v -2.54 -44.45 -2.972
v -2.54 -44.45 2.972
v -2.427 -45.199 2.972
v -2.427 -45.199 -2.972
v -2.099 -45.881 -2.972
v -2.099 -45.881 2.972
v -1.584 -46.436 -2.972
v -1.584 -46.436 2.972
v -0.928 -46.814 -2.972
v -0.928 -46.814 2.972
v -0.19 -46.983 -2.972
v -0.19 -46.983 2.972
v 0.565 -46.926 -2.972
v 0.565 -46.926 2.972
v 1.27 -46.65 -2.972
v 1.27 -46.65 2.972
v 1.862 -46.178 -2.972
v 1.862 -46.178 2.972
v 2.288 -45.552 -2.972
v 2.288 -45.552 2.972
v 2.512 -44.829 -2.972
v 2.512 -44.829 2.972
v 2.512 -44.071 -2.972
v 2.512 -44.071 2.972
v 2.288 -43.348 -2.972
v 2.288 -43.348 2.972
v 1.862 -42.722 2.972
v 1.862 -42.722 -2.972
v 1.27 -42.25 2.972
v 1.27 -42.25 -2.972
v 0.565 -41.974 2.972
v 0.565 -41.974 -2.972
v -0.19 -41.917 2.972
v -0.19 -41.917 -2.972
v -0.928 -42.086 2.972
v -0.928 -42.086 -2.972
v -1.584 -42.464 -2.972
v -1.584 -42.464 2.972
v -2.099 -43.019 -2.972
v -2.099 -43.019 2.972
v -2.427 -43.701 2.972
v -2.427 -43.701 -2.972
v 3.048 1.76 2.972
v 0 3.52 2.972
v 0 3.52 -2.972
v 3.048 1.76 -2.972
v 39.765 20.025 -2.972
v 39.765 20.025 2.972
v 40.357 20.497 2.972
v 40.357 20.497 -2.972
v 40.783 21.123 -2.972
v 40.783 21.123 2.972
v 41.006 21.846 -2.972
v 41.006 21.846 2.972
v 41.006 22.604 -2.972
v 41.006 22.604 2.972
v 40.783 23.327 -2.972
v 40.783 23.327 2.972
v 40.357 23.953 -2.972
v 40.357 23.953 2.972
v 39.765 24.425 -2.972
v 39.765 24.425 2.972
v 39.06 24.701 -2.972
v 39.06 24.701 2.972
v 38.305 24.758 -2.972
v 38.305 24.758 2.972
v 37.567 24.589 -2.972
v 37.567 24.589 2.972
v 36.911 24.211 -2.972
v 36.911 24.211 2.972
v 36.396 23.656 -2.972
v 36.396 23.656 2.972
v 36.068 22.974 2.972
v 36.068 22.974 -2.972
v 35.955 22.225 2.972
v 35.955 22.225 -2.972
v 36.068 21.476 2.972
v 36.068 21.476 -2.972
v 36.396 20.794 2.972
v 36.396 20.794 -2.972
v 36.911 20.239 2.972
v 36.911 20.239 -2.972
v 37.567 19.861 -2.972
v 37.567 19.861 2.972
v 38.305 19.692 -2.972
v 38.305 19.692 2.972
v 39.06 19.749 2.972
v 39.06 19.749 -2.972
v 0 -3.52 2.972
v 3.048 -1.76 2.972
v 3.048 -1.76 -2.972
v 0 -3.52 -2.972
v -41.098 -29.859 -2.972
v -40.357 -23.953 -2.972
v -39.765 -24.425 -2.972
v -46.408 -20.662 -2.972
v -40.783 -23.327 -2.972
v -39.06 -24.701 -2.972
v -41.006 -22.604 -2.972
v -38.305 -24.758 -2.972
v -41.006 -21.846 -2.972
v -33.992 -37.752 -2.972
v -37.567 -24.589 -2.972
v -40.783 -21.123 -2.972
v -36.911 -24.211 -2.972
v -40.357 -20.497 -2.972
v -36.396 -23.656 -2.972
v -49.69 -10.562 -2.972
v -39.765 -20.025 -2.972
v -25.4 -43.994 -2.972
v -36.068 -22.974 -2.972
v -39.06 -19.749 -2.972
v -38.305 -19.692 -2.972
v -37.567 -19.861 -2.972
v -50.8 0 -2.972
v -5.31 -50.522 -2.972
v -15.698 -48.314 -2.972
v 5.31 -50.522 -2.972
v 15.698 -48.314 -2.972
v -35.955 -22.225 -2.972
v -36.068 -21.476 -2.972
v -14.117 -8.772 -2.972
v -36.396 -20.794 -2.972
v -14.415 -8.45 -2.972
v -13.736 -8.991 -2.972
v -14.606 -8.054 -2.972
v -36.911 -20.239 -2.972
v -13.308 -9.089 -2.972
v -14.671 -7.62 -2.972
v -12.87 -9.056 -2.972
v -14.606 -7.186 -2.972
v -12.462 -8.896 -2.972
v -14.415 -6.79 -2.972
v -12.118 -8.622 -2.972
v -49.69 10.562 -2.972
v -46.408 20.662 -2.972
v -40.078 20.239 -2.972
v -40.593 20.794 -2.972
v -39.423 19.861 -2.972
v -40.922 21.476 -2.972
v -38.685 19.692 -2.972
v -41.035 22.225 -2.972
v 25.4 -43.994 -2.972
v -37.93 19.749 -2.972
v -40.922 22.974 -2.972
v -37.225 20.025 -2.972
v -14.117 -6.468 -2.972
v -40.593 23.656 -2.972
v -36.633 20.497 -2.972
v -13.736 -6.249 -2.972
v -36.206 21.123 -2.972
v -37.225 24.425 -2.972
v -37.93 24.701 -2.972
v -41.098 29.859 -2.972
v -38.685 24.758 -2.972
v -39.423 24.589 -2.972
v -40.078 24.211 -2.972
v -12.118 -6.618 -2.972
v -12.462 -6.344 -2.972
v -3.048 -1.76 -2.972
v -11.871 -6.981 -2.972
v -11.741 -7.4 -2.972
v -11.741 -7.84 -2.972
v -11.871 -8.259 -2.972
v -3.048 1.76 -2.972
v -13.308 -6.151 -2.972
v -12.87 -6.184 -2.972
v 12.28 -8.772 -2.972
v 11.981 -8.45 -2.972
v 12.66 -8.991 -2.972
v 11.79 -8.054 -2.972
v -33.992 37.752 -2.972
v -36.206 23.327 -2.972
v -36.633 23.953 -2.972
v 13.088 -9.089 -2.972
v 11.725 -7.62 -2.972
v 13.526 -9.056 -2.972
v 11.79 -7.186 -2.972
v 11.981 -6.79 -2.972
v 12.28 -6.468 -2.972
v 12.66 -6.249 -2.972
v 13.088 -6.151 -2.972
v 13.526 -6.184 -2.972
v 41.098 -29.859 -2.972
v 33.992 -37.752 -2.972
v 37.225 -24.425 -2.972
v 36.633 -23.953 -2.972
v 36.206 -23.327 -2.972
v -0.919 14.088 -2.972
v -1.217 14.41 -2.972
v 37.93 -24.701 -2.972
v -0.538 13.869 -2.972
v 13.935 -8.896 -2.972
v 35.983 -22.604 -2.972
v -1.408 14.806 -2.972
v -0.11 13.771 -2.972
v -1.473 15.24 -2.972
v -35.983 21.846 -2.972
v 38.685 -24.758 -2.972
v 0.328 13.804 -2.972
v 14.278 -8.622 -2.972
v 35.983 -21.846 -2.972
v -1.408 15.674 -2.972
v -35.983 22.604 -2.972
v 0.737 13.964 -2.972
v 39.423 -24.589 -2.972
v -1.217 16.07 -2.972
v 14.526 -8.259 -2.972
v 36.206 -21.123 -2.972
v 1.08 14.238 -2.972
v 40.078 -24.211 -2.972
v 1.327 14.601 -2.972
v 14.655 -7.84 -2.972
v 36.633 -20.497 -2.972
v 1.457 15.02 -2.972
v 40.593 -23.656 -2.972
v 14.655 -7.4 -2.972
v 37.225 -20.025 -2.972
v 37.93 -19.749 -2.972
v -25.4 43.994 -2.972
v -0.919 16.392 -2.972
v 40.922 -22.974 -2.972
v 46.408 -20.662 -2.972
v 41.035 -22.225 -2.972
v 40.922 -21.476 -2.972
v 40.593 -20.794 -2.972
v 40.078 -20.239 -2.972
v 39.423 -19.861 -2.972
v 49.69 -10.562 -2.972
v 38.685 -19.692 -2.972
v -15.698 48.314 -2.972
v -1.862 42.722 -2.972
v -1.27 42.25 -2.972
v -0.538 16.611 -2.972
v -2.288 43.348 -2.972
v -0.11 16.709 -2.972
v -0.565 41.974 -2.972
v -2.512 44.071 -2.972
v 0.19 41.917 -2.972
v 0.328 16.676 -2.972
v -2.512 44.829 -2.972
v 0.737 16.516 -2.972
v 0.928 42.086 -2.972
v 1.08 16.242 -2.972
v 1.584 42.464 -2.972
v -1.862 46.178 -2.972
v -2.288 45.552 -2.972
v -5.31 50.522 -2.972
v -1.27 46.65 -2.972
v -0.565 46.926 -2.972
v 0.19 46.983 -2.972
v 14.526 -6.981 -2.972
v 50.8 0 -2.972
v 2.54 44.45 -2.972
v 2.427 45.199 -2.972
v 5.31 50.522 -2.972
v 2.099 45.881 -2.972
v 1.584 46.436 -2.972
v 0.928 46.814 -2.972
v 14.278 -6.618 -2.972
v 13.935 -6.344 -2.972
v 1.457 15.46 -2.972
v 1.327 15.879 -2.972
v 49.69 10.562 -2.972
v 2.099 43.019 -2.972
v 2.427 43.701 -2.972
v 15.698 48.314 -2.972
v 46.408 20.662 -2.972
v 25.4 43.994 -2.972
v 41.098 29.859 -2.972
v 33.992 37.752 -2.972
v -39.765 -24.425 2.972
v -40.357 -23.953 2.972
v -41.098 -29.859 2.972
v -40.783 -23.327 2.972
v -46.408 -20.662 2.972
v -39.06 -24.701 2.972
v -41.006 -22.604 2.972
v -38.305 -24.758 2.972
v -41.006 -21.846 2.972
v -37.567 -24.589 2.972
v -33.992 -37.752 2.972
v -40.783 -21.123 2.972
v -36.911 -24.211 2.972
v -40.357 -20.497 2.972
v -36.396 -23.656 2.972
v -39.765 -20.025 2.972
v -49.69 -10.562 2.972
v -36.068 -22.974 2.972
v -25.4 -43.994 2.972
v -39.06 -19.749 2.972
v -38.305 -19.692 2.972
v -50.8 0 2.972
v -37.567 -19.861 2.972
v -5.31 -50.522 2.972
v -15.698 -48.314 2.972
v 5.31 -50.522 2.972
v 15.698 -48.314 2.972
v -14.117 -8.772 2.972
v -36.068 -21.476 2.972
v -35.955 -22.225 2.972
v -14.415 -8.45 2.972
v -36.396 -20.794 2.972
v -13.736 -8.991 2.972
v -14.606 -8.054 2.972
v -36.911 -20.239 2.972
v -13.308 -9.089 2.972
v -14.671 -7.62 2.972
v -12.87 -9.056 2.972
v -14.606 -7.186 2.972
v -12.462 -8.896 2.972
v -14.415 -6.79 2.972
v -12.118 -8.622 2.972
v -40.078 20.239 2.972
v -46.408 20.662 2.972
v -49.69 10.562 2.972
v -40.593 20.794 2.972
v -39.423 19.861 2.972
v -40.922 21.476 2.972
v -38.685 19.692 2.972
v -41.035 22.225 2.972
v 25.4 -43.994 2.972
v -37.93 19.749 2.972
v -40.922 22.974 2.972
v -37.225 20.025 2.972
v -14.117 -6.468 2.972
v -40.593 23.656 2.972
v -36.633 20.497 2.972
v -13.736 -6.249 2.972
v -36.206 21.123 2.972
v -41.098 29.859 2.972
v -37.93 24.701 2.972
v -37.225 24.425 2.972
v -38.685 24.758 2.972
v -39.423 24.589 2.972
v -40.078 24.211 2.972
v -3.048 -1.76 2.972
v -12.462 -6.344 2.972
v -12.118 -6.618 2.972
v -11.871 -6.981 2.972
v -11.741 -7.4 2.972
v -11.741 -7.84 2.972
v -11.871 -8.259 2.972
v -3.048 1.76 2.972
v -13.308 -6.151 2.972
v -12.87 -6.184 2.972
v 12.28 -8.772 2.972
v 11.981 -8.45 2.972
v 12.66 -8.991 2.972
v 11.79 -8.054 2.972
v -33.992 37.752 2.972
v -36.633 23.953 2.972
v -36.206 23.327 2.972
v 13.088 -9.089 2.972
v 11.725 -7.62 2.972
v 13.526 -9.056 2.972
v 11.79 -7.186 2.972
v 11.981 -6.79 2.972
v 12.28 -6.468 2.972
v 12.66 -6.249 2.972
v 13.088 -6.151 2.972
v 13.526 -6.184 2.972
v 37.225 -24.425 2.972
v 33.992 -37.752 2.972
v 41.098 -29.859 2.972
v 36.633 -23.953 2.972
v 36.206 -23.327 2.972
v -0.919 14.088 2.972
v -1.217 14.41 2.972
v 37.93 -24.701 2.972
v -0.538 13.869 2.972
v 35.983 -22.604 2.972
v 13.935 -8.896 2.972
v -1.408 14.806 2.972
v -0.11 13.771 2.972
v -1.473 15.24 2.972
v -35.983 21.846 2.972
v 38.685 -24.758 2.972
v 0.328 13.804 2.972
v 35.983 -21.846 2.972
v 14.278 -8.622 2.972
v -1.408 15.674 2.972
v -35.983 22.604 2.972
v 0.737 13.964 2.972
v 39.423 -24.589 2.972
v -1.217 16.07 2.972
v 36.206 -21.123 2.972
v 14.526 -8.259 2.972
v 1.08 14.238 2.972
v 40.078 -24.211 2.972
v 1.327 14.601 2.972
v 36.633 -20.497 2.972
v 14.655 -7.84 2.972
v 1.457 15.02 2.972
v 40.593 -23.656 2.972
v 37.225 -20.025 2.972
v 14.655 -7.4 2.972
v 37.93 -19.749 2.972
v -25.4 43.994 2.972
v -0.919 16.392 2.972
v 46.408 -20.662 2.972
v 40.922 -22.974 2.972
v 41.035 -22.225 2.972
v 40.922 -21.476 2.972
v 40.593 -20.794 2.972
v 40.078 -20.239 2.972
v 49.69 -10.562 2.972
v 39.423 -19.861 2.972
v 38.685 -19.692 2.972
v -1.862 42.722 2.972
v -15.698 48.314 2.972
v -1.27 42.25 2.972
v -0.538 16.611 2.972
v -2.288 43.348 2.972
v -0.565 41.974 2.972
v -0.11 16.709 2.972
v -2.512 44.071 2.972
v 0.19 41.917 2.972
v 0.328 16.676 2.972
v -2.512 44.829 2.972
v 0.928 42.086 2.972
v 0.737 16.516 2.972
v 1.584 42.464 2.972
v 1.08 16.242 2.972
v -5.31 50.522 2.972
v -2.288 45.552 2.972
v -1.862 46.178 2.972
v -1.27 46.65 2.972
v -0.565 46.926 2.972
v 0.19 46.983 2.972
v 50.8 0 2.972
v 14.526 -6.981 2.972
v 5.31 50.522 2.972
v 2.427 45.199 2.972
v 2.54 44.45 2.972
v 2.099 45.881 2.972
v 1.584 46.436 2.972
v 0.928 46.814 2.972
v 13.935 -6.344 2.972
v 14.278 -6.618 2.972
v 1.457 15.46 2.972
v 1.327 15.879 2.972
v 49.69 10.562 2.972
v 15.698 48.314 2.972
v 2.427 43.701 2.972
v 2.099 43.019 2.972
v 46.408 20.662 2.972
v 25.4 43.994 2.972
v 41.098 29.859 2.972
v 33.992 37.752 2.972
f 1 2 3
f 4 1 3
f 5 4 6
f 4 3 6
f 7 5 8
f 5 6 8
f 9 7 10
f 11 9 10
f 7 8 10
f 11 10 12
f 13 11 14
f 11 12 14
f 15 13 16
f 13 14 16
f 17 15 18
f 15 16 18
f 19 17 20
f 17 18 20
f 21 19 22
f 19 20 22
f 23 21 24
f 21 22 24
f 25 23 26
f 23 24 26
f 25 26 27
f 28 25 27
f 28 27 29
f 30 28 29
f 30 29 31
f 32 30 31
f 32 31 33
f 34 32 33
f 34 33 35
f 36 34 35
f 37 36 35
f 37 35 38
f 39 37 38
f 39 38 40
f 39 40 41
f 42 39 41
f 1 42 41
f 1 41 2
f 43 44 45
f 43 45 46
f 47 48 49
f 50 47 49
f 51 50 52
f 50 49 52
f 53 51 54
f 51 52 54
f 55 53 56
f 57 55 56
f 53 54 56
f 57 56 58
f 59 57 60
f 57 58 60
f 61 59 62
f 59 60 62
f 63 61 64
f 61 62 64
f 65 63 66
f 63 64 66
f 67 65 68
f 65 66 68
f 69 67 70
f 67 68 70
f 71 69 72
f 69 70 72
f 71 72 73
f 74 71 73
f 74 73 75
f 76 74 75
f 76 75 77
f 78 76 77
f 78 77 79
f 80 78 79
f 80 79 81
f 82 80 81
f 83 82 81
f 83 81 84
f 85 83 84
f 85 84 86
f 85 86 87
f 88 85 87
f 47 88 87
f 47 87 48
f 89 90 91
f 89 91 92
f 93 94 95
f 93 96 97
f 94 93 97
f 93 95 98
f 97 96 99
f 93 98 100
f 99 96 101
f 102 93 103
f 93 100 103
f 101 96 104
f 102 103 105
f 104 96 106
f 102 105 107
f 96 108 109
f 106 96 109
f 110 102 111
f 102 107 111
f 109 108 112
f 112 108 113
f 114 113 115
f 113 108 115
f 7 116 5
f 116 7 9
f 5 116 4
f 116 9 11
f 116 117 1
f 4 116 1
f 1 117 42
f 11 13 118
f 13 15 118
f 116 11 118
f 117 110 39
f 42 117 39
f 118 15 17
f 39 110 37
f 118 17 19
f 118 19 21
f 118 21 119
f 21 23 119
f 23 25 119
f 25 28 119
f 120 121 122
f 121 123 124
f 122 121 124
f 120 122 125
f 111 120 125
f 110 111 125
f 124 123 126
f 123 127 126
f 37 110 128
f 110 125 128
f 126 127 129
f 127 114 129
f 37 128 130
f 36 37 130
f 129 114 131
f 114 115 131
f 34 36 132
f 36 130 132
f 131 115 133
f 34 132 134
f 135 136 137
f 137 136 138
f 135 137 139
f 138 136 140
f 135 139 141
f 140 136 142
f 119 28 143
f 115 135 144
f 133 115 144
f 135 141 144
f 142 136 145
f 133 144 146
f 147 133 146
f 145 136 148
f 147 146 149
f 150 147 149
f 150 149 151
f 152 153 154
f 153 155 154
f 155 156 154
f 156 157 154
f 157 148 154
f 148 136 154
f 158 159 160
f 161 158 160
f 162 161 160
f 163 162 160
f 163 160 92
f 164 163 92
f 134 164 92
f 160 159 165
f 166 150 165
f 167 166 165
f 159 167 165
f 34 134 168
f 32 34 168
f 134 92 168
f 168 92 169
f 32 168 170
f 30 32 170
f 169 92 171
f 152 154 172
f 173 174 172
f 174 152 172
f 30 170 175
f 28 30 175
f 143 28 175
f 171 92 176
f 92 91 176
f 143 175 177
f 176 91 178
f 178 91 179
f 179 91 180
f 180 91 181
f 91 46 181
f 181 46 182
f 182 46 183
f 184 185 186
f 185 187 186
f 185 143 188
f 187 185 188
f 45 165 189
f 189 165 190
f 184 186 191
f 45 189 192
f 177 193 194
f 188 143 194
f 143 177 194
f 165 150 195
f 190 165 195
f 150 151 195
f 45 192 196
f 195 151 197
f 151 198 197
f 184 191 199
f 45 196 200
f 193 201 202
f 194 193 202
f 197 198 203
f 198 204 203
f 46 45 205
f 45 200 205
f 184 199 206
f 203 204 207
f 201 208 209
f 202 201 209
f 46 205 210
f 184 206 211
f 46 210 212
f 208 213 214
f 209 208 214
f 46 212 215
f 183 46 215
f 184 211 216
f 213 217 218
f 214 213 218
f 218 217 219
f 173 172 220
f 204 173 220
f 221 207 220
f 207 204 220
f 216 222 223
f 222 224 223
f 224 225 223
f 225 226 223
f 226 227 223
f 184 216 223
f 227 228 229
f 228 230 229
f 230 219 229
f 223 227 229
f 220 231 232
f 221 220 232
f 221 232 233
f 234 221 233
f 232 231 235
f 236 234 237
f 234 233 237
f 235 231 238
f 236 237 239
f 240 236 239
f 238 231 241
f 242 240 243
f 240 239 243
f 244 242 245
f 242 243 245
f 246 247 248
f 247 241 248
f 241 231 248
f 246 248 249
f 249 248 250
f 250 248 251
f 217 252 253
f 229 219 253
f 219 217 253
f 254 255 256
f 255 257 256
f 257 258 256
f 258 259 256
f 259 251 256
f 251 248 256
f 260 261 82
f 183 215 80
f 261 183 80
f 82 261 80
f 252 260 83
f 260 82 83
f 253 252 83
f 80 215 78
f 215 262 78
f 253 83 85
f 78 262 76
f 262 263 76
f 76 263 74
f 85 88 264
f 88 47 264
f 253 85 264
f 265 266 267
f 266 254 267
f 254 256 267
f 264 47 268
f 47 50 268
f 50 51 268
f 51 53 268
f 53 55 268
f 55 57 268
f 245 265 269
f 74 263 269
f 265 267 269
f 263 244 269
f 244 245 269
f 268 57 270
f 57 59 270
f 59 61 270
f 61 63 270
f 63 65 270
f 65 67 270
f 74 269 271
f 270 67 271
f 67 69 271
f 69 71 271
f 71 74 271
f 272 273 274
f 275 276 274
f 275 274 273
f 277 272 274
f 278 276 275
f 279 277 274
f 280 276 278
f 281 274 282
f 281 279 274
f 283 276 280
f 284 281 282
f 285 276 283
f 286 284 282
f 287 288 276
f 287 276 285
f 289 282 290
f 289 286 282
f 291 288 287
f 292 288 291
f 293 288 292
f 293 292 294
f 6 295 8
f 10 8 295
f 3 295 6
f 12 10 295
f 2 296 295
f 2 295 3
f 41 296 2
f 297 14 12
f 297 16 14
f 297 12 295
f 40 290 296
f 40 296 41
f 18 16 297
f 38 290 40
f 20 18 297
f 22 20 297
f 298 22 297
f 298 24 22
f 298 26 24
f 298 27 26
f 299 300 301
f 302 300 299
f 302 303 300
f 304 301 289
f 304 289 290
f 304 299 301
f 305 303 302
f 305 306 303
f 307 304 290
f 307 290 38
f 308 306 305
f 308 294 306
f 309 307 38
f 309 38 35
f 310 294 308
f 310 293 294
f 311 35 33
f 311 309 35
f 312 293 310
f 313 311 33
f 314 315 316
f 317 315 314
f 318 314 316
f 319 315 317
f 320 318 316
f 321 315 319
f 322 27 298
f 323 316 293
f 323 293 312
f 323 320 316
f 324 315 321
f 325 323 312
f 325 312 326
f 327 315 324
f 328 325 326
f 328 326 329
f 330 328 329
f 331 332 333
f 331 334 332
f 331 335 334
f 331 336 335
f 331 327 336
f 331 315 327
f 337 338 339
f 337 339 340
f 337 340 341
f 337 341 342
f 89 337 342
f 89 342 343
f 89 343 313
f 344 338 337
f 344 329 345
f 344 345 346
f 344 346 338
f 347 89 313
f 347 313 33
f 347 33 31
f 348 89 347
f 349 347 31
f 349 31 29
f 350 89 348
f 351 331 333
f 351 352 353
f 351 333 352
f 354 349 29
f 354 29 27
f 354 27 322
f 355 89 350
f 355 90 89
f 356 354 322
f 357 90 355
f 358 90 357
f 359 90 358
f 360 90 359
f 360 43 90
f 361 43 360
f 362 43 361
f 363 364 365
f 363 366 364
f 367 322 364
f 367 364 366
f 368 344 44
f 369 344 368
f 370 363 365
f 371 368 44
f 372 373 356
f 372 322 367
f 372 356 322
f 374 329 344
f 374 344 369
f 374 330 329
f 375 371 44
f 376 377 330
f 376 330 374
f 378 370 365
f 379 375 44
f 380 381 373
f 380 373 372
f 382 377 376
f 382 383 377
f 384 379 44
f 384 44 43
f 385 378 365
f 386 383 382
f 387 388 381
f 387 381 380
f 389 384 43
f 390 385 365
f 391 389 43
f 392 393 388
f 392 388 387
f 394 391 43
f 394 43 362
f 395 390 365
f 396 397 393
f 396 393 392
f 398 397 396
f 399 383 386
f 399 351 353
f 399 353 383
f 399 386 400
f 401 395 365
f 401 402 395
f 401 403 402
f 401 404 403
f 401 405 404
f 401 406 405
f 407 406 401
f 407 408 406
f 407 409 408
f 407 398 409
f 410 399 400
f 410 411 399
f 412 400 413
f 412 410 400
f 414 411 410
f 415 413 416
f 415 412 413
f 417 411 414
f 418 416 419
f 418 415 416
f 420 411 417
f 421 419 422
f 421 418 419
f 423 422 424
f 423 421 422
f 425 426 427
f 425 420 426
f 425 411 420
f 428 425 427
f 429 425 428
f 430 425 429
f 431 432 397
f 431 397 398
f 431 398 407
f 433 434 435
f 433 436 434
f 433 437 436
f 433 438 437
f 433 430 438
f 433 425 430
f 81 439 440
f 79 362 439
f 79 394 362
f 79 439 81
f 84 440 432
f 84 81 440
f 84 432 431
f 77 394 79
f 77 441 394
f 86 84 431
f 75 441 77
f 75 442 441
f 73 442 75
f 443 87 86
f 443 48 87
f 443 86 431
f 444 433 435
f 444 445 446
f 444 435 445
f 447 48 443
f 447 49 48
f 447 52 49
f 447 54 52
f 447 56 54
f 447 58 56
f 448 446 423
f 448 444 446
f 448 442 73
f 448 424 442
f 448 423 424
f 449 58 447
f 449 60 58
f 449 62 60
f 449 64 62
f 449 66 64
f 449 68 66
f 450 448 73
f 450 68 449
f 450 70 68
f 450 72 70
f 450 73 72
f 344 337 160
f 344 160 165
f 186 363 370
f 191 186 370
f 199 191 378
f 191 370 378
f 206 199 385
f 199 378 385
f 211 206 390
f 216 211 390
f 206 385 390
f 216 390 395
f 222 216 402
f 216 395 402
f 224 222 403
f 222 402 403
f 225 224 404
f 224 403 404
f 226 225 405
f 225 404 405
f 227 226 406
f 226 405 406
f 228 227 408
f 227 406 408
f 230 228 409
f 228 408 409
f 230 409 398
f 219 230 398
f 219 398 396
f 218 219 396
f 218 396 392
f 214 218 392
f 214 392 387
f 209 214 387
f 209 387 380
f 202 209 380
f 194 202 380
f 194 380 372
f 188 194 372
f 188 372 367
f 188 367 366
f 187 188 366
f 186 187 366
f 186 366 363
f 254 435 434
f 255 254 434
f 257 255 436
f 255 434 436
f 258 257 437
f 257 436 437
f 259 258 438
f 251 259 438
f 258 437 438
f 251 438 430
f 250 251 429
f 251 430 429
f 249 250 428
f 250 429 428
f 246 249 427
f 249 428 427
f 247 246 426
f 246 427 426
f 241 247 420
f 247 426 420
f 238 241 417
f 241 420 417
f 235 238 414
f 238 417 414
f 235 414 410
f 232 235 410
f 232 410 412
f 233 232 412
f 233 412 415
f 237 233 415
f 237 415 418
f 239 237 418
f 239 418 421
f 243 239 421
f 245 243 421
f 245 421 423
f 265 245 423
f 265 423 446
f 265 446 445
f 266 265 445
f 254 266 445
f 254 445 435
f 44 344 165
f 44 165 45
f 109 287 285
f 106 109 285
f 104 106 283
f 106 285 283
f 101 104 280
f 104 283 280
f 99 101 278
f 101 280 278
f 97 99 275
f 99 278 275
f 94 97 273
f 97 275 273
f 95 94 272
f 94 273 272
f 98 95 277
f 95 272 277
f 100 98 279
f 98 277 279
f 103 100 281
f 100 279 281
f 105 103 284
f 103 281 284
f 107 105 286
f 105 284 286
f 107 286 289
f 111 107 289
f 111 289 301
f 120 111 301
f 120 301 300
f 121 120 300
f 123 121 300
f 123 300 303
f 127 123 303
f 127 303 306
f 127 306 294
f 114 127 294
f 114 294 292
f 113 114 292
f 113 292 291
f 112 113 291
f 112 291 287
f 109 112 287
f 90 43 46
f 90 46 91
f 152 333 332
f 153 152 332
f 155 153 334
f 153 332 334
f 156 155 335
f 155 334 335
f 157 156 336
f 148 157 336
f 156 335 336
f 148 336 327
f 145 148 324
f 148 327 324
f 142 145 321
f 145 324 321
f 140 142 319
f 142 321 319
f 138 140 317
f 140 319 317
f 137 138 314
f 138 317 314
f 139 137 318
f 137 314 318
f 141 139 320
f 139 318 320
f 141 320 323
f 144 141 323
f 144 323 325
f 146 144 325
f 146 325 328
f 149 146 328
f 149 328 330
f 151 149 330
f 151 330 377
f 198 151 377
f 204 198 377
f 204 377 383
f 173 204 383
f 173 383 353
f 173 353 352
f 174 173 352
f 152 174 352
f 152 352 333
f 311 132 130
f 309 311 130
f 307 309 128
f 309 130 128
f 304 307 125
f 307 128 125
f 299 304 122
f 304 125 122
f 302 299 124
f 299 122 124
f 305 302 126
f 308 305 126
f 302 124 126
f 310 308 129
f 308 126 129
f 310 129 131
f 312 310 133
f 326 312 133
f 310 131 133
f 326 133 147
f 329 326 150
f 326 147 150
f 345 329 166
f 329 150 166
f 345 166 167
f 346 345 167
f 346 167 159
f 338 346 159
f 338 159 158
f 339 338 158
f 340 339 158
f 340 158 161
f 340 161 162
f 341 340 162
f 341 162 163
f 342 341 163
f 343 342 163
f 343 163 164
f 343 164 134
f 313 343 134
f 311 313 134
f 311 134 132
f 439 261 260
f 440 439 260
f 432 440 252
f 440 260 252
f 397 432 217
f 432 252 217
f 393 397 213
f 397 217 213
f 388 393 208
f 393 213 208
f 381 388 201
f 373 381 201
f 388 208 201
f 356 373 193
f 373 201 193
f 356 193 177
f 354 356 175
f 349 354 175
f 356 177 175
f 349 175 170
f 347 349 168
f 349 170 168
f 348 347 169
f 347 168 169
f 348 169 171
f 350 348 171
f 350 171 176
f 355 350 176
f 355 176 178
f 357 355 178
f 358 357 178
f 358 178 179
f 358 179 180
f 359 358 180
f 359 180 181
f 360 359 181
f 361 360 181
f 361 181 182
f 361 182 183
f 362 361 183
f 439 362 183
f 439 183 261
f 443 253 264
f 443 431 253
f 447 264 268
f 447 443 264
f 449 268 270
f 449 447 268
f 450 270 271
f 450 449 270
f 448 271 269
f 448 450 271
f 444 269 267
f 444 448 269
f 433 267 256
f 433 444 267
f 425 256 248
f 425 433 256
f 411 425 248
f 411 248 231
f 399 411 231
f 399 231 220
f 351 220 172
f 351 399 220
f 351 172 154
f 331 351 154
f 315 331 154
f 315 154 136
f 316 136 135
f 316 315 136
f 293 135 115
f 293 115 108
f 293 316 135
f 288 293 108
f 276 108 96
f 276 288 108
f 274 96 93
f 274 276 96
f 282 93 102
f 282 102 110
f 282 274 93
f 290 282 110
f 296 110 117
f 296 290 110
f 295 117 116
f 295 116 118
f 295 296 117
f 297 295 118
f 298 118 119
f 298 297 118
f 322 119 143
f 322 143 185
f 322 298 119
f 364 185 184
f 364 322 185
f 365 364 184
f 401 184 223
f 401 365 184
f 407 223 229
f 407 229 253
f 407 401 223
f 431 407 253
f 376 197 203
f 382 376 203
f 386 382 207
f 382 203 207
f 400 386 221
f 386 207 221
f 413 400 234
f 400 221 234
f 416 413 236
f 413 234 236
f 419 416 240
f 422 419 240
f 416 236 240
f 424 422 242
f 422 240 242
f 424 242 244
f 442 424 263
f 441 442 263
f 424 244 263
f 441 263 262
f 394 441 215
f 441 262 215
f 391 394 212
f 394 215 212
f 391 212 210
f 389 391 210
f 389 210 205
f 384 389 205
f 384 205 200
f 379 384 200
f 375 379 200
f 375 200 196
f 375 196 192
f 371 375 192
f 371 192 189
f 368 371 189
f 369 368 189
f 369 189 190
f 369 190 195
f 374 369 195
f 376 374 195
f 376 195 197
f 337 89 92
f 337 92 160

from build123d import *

# Parameters (mm, degrees)
SKETCH1_R                   = 50.8
BOSS_EXTRUDE1_DEPTH         = 2.9718
SKETCH2_R                   = 2.54
CUT_EXTRUDE1_DEPTH          = 73.087491155
CIRPATTERN1_COUNT           = 6
CUT_EXTRUDE2_DEPTH          = 73.087491155
F_32_0_116_DIAMETER_HOLE1_D = 2.9464
CIRPATTERN2_COUNT           = 3


with BuildPart() as part:
    # Sketch1 → Boss-Extrude1 (new, symmetric)
    with BuildSketch(Plane.XY):
        Circle(SKETCH1_R)
    extrude(amount=BOSS_EXTRUDE1_DEPTH, both=True)

    # Sketch2 → Cut-Extrude1 (cut, through all)
    with BuildSketch(Plane.XY.offset(2.9718)):
        with Locations((0, 44.45)):
            Circle(SKETCH2_R)
    cut_extrude1 = extrude(amount=-CUT_EXTRUDE1_DEPTH, mode=Mode.SUBTRACT)

    # CirPattern1: Cut-Extrude1 ×6 about axis
    cirpattern1_axis = Axis((0, 0, -3.4925), (0, 0, 1))
    for i in range(1, CIRPATTERN1_COUNT):
        add(cut_extrude1.rotate(cirpattern1_axis, i * 360 / CIRPATTERN1_COUNT), mode=Mode.SUBTRACT)

    # Sketch3 → Cut-Extrude2 (cut, through all)
    with BuildSketch(Plane.XY.offset(2.9718)):
        Polygon((0, 3.519527241), (3.048, 1.75976362), (3.048, -1.75976362), (0, -3.519527241), (-3.048, -1.75976362), (-3.048, 1.75976362), align=None)
    extrude(amount=-CUT_EXTRUDE2_DEPTH, mode=Mode.SUBTRACT)

    # #32 (0.116) Diameter Hole1 (through all)
    with Locations(Plane.XY.offset(2.9718)):
        with Locations((0, 15.24)):
            f_32_0_116_diameter_hole1 = Hole(F_32_0_116_DIAMETER_HOLE1_D / 2)

    # CirPattern2: #32 (0.116) Diameter Hole1 ×3 about axis
    cirpattern2_axis = Axis((0, 0, -3.4925), (0, 0, 1))
    for i in range(1, CIRPATTERN2_COUNT):
        add(f_32_0_116_diameter_hole1.rotate(cirpattern2_axis, i * 360 / CIRPATTERN2_COUNT), mode=Mode.SUBTRACT)


solid = part.part
